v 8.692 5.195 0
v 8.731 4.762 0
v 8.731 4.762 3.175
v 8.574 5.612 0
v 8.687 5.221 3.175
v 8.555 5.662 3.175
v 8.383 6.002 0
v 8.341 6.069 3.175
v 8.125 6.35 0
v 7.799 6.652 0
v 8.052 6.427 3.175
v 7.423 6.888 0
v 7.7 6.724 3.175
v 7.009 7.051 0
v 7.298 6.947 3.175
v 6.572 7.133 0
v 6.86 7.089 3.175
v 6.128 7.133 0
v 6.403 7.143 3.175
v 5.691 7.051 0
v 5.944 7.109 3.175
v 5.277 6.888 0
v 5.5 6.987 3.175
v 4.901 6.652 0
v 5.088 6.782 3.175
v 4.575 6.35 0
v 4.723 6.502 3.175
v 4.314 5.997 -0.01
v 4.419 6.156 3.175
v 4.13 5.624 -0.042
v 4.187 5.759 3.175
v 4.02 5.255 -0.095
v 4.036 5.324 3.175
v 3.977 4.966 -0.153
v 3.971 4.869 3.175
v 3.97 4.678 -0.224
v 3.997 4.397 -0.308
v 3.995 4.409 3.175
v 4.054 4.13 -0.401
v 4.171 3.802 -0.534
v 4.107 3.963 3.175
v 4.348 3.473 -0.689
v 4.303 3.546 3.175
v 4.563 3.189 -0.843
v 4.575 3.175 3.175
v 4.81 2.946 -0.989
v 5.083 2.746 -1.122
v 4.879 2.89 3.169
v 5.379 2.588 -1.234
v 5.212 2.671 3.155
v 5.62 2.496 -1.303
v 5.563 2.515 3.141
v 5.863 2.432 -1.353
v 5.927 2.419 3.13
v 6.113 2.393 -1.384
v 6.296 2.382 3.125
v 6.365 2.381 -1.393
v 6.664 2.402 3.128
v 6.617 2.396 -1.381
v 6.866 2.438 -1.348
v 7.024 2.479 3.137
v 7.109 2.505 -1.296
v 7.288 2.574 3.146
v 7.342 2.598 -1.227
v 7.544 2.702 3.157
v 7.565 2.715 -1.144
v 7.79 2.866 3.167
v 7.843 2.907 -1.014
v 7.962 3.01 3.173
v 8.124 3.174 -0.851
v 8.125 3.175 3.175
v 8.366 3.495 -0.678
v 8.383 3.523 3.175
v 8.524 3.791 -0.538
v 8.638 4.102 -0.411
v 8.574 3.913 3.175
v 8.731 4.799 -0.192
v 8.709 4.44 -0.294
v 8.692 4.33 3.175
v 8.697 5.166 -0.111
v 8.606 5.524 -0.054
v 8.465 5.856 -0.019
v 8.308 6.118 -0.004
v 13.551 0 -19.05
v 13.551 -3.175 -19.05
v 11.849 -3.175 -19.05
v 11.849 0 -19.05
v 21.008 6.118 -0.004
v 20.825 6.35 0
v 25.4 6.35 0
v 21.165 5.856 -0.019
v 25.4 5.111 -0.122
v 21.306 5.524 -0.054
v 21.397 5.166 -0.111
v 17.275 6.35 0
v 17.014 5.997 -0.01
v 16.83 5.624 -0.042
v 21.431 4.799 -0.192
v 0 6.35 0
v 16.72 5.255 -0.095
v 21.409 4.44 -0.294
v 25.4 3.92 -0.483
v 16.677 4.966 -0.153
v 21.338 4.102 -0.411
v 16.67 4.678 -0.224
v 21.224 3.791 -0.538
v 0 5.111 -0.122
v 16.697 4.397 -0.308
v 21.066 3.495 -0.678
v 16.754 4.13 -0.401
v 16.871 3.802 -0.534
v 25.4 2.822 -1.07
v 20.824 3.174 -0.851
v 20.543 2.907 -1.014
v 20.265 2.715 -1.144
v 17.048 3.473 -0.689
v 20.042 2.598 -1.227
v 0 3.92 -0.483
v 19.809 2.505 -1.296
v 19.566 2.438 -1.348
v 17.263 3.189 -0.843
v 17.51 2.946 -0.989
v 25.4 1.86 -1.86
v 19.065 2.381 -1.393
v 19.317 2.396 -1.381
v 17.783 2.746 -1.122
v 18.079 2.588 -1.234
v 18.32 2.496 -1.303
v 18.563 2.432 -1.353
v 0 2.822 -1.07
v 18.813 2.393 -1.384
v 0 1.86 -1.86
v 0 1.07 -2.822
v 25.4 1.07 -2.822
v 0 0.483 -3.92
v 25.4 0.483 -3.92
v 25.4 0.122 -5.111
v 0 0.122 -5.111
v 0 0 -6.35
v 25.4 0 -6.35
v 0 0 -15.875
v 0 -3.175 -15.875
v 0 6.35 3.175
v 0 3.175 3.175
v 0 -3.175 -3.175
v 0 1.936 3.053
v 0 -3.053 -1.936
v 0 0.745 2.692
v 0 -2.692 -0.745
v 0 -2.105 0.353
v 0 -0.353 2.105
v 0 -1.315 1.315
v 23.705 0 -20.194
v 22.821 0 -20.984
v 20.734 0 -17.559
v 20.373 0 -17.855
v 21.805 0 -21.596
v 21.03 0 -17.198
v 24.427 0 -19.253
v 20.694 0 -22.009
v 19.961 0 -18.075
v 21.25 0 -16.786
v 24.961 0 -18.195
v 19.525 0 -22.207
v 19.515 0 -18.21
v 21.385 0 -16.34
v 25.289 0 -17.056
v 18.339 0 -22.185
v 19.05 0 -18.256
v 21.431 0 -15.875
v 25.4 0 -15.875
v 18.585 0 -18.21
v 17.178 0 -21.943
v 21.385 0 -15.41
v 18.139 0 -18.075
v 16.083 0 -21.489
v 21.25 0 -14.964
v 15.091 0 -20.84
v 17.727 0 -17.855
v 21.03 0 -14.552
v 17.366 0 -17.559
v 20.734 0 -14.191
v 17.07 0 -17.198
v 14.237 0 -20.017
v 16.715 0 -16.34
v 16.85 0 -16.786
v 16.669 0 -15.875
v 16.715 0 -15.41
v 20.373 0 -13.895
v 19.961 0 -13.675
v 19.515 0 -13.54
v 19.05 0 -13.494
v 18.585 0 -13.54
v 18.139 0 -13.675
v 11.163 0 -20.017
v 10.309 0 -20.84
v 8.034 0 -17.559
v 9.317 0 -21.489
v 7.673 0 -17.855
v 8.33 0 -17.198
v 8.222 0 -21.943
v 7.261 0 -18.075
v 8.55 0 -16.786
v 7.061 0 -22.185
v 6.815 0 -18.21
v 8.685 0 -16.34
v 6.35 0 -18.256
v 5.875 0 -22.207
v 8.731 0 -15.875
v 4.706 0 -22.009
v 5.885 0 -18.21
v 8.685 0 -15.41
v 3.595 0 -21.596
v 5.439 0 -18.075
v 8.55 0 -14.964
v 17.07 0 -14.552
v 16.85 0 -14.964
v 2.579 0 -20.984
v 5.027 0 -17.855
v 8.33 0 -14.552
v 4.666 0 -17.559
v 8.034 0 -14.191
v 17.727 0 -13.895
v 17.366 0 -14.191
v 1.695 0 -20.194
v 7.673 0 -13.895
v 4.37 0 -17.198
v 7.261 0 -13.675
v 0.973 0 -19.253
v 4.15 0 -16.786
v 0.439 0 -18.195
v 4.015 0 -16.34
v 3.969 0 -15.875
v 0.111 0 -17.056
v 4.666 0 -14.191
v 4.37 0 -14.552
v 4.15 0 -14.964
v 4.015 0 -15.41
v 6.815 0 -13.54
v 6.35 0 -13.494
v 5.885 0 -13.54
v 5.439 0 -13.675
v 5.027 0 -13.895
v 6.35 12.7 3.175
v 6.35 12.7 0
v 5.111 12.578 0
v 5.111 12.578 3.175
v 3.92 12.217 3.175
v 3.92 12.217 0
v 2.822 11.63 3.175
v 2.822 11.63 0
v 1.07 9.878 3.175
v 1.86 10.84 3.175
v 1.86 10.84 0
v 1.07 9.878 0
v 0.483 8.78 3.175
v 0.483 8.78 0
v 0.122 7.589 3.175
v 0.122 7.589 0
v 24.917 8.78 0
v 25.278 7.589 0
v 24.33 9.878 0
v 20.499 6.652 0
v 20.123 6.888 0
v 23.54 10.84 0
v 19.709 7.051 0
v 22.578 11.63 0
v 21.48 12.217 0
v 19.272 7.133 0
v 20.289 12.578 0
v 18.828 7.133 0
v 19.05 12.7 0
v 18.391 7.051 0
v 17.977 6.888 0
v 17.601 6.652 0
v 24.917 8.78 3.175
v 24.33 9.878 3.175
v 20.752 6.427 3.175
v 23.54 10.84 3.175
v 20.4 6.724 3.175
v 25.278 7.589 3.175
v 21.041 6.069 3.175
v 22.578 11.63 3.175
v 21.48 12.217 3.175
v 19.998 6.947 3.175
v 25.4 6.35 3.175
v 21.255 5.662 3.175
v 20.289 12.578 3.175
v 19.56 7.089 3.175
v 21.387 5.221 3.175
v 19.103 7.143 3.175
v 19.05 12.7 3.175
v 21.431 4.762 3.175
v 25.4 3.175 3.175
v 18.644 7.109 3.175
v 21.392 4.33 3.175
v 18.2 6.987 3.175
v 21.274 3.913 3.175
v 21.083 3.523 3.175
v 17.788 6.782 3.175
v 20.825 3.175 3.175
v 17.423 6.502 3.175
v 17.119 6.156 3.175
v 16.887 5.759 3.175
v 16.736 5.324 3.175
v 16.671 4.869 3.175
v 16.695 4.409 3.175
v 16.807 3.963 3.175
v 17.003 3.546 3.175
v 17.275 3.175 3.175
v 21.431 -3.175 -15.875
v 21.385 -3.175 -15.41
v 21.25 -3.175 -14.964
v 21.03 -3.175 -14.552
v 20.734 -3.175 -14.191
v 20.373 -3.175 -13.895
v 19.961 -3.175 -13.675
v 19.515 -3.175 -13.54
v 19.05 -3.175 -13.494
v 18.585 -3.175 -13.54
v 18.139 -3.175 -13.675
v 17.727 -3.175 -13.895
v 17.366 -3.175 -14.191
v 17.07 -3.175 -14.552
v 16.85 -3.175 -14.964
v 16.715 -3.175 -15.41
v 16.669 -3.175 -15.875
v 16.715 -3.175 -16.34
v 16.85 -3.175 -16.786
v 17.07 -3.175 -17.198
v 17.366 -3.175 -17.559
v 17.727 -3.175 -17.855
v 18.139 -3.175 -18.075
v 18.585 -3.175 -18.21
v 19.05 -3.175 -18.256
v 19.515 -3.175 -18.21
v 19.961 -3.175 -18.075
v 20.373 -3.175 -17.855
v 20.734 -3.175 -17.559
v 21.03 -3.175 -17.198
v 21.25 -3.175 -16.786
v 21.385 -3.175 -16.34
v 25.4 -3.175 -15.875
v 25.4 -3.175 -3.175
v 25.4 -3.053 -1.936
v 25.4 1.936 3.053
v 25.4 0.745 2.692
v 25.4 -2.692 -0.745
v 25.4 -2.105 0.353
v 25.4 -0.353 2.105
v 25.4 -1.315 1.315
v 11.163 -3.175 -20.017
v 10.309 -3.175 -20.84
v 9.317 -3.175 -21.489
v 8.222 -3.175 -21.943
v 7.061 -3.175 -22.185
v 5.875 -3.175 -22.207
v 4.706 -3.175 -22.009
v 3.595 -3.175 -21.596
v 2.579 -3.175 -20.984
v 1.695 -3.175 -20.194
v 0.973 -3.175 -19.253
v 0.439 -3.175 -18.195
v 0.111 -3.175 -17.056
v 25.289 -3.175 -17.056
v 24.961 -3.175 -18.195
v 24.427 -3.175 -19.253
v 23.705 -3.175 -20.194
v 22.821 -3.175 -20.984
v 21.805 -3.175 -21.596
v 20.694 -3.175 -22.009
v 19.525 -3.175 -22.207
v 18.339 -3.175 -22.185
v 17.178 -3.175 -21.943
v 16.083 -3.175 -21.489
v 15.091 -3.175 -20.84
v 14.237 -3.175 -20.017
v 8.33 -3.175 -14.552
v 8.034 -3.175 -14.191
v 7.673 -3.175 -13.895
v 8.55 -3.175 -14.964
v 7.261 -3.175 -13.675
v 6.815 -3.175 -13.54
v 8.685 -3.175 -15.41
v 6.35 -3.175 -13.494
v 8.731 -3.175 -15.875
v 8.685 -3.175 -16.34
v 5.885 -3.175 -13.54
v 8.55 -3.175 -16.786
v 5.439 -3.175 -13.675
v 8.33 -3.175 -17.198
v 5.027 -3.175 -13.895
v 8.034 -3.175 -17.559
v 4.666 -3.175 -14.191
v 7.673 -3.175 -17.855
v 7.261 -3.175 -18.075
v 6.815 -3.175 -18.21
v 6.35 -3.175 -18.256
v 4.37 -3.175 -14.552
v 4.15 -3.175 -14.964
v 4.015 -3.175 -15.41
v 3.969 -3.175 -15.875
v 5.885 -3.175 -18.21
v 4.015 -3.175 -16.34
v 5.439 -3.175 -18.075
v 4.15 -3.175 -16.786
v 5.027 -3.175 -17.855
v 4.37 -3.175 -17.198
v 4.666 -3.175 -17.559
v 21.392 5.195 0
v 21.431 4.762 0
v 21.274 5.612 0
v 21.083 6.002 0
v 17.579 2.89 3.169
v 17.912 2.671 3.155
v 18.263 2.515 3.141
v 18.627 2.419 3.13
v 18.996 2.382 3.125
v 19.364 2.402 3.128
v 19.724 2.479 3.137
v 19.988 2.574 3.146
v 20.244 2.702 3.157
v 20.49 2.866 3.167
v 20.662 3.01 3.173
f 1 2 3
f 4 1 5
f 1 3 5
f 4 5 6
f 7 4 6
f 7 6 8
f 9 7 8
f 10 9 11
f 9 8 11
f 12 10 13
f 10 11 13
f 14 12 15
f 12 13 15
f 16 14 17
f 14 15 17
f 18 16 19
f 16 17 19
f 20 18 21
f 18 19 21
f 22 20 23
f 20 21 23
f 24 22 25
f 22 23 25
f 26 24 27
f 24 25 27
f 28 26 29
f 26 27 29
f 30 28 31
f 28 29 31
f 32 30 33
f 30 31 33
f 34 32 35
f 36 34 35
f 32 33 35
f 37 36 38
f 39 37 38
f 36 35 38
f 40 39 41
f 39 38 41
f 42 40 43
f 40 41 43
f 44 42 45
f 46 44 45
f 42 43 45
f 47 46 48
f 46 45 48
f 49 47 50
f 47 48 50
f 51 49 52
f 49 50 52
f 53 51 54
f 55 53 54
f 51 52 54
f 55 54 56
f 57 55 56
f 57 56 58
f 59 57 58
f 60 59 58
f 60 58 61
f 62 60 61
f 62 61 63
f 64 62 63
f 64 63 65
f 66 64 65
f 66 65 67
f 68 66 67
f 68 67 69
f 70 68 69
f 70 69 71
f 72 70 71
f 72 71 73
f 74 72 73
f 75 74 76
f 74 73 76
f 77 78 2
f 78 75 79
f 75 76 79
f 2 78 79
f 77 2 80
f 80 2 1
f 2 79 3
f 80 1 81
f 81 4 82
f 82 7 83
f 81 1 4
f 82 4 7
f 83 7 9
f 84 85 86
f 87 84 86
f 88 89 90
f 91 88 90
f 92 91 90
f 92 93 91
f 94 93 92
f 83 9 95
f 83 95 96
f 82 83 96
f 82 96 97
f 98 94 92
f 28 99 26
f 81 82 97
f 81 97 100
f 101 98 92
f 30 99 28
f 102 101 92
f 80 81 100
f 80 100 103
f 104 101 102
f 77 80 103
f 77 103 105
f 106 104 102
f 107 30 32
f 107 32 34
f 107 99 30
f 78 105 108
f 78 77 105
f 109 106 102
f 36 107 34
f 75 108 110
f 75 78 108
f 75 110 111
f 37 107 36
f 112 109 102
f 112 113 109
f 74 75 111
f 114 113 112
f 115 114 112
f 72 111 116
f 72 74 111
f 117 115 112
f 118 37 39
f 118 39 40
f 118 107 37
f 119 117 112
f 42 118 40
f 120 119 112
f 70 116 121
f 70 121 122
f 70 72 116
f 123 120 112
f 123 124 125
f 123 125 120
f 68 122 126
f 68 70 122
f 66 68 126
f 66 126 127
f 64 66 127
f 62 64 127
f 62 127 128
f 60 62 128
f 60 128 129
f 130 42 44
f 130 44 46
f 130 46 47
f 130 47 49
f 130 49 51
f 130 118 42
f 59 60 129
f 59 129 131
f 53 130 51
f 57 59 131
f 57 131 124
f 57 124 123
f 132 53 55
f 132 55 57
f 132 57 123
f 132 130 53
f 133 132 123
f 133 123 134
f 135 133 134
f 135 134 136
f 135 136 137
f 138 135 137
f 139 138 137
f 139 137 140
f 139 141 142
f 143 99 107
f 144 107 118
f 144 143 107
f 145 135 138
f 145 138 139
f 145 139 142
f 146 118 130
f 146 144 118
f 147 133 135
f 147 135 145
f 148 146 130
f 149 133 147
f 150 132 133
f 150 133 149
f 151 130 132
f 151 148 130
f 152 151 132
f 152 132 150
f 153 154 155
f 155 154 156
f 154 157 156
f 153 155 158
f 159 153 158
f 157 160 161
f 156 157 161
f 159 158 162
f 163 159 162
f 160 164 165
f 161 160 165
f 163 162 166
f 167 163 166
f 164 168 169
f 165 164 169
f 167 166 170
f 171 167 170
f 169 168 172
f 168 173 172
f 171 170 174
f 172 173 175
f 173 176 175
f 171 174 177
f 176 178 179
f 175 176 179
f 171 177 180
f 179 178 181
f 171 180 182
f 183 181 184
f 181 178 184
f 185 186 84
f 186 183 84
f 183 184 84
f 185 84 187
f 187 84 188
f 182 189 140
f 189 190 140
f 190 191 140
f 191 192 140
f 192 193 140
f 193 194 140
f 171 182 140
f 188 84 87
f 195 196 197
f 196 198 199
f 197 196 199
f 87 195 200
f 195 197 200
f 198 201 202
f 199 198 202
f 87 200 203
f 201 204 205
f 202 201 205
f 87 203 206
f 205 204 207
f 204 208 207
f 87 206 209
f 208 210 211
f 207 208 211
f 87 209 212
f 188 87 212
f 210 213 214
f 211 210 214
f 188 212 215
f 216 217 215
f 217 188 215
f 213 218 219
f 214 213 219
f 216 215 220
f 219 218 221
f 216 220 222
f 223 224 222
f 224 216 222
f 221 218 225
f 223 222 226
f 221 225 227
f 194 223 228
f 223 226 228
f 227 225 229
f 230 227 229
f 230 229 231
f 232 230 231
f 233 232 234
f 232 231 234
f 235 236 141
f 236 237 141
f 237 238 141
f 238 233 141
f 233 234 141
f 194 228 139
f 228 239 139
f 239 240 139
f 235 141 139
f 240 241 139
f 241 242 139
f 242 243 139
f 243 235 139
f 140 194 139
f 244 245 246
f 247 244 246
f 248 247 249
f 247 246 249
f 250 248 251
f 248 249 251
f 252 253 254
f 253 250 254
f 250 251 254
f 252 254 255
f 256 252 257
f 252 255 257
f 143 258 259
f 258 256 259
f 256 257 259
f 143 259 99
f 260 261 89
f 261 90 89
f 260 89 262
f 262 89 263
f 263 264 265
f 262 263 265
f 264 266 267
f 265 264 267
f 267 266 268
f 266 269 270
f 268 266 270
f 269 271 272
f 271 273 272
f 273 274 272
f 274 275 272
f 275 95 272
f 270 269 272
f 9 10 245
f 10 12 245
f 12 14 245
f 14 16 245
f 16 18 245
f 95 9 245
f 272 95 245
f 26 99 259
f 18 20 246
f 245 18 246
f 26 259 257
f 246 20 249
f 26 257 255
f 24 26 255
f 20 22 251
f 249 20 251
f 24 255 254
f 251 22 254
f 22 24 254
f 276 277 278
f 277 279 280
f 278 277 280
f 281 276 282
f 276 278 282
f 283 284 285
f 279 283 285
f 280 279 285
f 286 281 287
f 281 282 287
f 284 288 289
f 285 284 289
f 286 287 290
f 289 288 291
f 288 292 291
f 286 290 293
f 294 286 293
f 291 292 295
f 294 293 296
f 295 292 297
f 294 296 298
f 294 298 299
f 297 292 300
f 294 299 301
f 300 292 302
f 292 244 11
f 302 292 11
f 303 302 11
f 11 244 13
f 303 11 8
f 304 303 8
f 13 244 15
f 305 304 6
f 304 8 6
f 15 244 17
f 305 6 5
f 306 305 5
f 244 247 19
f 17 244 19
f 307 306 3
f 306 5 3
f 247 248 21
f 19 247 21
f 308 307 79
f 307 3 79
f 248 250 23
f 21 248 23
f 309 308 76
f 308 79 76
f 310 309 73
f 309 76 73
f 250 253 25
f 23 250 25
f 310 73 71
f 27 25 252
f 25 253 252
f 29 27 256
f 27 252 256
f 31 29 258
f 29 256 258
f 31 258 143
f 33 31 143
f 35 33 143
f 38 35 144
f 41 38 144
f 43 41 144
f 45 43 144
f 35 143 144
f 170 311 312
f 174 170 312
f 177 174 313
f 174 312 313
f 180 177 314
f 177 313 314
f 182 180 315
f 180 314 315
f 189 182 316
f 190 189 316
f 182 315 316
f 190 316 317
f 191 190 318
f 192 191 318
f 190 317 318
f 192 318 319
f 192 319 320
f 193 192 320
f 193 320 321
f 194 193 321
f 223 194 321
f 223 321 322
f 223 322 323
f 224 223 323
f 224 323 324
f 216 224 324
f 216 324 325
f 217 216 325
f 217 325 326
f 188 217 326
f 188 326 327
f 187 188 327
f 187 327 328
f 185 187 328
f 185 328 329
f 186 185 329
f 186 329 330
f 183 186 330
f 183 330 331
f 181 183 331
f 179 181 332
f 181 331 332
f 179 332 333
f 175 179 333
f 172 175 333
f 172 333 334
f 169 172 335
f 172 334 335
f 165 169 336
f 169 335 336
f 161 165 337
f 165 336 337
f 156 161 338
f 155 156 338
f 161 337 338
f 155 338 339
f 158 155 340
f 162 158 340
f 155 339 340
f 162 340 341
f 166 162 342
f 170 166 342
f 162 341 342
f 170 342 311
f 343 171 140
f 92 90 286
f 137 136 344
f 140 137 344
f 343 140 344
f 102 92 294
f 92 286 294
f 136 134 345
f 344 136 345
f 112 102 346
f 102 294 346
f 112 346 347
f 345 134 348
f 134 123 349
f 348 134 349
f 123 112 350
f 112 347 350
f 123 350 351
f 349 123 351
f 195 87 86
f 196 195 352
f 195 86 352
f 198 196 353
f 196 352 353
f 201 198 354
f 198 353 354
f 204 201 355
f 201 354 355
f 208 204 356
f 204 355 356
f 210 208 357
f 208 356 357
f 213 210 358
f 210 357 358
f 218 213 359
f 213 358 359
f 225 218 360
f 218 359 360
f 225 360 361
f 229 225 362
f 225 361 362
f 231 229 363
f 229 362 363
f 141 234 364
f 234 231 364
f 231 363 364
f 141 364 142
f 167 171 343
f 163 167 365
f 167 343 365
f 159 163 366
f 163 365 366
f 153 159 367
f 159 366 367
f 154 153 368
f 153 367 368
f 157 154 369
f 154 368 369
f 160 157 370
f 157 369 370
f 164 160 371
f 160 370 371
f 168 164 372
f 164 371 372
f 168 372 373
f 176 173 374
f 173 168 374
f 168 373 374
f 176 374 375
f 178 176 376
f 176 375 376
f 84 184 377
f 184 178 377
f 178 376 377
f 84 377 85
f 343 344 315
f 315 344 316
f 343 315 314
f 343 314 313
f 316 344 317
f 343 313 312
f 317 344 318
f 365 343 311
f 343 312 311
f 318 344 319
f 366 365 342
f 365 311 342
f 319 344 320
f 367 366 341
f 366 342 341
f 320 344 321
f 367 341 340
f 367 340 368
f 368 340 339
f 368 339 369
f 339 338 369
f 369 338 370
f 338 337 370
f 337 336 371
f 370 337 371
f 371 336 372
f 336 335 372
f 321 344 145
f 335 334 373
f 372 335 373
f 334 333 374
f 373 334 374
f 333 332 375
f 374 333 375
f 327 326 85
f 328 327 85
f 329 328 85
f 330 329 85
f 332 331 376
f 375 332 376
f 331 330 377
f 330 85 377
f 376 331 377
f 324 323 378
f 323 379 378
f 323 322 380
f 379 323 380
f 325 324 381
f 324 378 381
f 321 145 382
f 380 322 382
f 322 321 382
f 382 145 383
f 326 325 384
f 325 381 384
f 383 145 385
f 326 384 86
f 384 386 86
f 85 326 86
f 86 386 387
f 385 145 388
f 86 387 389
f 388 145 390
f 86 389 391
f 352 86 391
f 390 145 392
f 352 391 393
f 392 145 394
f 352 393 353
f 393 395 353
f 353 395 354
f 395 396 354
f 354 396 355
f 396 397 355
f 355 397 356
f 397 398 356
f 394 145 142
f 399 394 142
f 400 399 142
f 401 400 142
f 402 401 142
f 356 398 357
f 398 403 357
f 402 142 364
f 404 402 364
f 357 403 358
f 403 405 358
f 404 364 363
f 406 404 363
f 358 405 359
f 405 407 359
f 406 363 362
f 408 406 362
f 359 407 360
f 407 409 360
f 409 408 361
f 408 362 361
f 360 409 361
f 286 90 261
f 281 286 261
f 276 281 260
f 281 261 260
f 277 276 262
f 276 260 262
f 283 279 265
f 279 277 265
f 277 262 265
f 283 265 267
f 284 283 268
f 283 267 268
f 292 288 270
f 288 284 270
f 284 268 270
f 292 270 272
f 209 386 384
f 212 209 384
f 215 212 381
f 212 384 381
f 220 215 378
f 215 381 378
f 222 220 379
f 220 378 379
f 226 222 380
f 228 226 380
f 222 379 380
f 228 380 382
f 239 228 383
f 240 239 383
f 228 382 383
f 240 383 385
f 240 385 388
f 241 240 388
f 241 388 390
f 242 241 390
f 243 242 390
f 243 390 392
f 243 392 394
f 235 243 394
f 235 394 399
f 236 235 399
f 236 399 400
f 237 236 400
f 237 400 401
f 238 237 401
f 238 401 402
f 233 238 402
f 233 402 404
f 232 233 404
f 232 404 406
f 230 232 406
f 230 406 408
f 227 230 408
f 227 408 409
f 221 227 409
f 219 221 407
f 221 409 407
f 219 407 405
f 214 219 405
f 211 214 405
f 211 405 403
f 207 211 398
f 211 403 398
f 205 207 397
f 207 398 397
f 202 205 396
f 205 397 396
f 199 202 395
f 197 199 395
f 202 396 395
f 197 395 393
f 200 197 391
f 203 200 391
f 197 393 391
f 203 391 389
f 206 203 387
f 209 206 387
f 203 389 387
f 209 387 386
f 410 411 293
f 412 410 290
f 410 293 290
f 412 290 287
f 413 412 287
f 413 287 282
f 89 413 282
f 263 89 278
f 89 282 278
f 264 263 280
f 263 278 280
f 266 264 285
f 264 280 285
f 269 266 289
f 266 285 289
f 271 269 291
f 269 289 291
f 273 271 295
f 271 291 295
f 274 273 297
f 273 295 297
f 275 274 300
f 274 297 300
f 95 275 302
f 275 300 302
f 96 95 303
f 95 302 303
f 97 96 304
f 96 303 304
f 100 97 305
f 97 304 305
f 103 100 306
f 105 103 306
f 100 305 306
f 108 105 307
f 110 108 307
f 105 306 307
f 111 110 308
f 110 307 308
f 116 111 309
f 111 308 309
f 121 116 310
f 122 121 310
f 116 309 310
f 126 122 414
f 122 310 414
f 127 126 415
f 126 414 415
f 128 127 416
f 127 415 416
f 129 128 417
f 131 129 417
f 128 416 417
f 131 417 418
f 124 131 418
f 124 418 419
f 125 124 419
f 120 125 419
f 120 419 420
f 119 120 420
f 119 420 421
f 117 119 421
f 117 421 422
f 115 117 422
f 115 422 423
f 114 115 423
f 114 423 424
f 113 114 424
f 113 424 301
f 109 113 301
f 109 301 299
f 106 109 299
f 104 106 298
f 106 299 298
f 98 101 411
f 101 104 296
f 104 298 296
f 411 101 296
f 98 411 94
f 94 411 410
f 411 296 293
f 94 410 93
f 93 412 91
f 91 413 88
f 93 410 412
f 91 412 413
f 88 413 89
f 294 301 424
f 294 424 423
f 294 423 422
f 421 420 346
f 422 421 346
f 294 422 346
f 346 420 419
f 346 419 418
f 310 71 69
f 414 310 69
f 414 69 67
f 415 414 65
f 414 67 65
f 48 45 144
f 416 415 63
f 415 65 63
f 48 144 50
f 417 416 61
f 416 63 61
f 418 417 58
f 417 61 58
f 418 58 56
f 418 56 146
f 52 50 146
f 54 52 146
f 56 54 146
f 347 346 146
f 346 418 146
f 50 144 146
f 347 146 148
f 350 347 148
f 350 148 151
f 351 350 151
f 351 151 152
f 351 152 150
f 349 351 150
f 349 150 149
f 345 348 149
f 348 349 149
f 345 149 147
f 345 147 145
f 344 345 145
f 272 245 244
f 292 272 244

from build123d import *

# Parameters (mm, degrees)
F1_DEPTH     = 25.4
F2_R         = 2.38125
F3_DEPTH     = 28.576
F4_R         = 2.38125
F5_DEPTH     = 15.876
F6_T4_DEPTH  = 25.4
F6_S5_R      = 2.38125
F6_T6_DEPTH  = 15
F6_S7_R      = 2.38125
F6_T8_DEPTH  = 15
F6_T9_DEPTH  = 57.15
F6_T11_DEPTH = 34.925


# Not quite as in the source:
# - a fillet or chamfer that OpenCascade refuses, or shapes differently, is made with other operations: its cross-section is extruded or revolved along the edge and cut away or added


with BuildPart() as f1:
    # F0 (on Right) → F1 (new body)
    with BuildSketch(Plane.YZ):
        Polygon((0, 0), (12.7, 0), (12.7, 3.175), (-3.175, 3.175), (-3.175, -25.4), (0, -25.4), align=None)
    extrude(amount=F1_DEPTH)

    # F2 (on face) → F3 (cut, through all)
    with BuildSketch(Plane.XY.offset(3.175)):
        with Locations((6.35, 4.7625)):
            Circle(F2_R)
        with Locations((19.05, 4.7625)):
            Circle(F2_R)
    extrude(amount=-F3_DEPTH, mode=Mode.SUBTRACT)

    # F4 (on face) → F5 (cut, through all)
    with BuildSketch(Plane.XZ.offset(3.175)):
        with BuildLine():
            Line((13.550738686, -19.05), (11.849261314, -19.05))
            ThreePointArc((11.849261314, -19.05), (4.706499047, -22.0086289925), (0, -15.8749999656))
            Line((0, -15.8749999656), (0, -25.4))
            Line((0, -25.4), (25.4, -25.4))
            Line((25.4, -25.4), (25.4, -15.875))
            ThreePointArc((25.4, -15.875), (20.6935009364, -22.0086289969), (13.550738686, -19.05))
        make_face()
        with Locations((19.05, -15.875)):
            Circle(F4_R)
        with Locations((6.35, -15.875)):
            Circle(F4_R)
    extrude(amount=-F5_DEPTH, mode=Mode.SUBTRACT)

    # F6: fillet of radius 6.35 on 4 edges, made by hand


with BuildPart() as f6_tool2:
    # F6_s3 → F6_t4 (new body)
    with BuildSketch(Plane.YZ):
        with BuildLine():
            ThreePointArc((6.35, 0), (1.8598719395, -1.8598719395), (0, -6.35))
            Line((0, -6.35), (0, 0))
            Line((0, 0), (6.35, 0))
        make_face()
    extrude(amount=F6_T4_DEPTH)

    # F6_s5 → F6_t6 (cut, symmetric)
    with BuildSketch(Plane.XY.offset(-3.2)):
        with Locations((19.05, 4.7625)):
            Circle(F6_S5_R)
    extrude(amount=F6_T6_DEPTH, both=True, mode=Mode.SUBTRACT)

    # F6_s7 → F6_t8 (cut, symmetric)
    with BuildSketch(Plane.XY.offset(-3.2)):
        with Locations((6.35, 4.7625)):
            Circle(F6_S7_R)
    extrude(amount=F6_T8_DEPTH, both=True, mode=Mode.SUBTRACT)


with BuildPart() as f1_1:
    add(f1.part)

    # F6_t1: union F6_tool2
    add(f6_tool2.part)

    # F6_s10 → F6_t9 (cut)
    with BuildSketch(Plane.YZ.offset(-15.875)):
        with BuildLine():
            ThreePointArc((3.175, 3.175), (-1.3151280605, 1.3151280605), (-3.175, -3.175))
            Line((-3.175, -3.175), (-3.175, 3.175))
            Line((-3.175, 3.175), (3.175, 3.175))
        make_face()
    extrude(amount=F6_T9_DEPTH, mode=Mode.SUBTRACT)

    # F6_s12 → F6_t11 (cut)
    with BuildSketch(Plane.XY.offset(-15.875)):
        with BuildLine():
            ThreePointArc((6.35, 12.7), (1.8598719395, 10.8401280605), (0, 6.35))
            Line((0, 6.35), (0, 12.7))
            Line((0, 12.7), (6.35, 12.7))
        make_face()
        with BuildLine():
            ThreePointArc((25.4, 6.35), (23.5401280605, 10.8401280605), (19.05, 12.7))
            Line((19.05, 12.7), (25.4, 12.7))
            Line((25.4, 12.7), (25.4, 6.35))
        make_face()
    extrude(amount=F6_T11_DEPTH, mode=Mode.SUBTRACT)


solid = f1_1.part
